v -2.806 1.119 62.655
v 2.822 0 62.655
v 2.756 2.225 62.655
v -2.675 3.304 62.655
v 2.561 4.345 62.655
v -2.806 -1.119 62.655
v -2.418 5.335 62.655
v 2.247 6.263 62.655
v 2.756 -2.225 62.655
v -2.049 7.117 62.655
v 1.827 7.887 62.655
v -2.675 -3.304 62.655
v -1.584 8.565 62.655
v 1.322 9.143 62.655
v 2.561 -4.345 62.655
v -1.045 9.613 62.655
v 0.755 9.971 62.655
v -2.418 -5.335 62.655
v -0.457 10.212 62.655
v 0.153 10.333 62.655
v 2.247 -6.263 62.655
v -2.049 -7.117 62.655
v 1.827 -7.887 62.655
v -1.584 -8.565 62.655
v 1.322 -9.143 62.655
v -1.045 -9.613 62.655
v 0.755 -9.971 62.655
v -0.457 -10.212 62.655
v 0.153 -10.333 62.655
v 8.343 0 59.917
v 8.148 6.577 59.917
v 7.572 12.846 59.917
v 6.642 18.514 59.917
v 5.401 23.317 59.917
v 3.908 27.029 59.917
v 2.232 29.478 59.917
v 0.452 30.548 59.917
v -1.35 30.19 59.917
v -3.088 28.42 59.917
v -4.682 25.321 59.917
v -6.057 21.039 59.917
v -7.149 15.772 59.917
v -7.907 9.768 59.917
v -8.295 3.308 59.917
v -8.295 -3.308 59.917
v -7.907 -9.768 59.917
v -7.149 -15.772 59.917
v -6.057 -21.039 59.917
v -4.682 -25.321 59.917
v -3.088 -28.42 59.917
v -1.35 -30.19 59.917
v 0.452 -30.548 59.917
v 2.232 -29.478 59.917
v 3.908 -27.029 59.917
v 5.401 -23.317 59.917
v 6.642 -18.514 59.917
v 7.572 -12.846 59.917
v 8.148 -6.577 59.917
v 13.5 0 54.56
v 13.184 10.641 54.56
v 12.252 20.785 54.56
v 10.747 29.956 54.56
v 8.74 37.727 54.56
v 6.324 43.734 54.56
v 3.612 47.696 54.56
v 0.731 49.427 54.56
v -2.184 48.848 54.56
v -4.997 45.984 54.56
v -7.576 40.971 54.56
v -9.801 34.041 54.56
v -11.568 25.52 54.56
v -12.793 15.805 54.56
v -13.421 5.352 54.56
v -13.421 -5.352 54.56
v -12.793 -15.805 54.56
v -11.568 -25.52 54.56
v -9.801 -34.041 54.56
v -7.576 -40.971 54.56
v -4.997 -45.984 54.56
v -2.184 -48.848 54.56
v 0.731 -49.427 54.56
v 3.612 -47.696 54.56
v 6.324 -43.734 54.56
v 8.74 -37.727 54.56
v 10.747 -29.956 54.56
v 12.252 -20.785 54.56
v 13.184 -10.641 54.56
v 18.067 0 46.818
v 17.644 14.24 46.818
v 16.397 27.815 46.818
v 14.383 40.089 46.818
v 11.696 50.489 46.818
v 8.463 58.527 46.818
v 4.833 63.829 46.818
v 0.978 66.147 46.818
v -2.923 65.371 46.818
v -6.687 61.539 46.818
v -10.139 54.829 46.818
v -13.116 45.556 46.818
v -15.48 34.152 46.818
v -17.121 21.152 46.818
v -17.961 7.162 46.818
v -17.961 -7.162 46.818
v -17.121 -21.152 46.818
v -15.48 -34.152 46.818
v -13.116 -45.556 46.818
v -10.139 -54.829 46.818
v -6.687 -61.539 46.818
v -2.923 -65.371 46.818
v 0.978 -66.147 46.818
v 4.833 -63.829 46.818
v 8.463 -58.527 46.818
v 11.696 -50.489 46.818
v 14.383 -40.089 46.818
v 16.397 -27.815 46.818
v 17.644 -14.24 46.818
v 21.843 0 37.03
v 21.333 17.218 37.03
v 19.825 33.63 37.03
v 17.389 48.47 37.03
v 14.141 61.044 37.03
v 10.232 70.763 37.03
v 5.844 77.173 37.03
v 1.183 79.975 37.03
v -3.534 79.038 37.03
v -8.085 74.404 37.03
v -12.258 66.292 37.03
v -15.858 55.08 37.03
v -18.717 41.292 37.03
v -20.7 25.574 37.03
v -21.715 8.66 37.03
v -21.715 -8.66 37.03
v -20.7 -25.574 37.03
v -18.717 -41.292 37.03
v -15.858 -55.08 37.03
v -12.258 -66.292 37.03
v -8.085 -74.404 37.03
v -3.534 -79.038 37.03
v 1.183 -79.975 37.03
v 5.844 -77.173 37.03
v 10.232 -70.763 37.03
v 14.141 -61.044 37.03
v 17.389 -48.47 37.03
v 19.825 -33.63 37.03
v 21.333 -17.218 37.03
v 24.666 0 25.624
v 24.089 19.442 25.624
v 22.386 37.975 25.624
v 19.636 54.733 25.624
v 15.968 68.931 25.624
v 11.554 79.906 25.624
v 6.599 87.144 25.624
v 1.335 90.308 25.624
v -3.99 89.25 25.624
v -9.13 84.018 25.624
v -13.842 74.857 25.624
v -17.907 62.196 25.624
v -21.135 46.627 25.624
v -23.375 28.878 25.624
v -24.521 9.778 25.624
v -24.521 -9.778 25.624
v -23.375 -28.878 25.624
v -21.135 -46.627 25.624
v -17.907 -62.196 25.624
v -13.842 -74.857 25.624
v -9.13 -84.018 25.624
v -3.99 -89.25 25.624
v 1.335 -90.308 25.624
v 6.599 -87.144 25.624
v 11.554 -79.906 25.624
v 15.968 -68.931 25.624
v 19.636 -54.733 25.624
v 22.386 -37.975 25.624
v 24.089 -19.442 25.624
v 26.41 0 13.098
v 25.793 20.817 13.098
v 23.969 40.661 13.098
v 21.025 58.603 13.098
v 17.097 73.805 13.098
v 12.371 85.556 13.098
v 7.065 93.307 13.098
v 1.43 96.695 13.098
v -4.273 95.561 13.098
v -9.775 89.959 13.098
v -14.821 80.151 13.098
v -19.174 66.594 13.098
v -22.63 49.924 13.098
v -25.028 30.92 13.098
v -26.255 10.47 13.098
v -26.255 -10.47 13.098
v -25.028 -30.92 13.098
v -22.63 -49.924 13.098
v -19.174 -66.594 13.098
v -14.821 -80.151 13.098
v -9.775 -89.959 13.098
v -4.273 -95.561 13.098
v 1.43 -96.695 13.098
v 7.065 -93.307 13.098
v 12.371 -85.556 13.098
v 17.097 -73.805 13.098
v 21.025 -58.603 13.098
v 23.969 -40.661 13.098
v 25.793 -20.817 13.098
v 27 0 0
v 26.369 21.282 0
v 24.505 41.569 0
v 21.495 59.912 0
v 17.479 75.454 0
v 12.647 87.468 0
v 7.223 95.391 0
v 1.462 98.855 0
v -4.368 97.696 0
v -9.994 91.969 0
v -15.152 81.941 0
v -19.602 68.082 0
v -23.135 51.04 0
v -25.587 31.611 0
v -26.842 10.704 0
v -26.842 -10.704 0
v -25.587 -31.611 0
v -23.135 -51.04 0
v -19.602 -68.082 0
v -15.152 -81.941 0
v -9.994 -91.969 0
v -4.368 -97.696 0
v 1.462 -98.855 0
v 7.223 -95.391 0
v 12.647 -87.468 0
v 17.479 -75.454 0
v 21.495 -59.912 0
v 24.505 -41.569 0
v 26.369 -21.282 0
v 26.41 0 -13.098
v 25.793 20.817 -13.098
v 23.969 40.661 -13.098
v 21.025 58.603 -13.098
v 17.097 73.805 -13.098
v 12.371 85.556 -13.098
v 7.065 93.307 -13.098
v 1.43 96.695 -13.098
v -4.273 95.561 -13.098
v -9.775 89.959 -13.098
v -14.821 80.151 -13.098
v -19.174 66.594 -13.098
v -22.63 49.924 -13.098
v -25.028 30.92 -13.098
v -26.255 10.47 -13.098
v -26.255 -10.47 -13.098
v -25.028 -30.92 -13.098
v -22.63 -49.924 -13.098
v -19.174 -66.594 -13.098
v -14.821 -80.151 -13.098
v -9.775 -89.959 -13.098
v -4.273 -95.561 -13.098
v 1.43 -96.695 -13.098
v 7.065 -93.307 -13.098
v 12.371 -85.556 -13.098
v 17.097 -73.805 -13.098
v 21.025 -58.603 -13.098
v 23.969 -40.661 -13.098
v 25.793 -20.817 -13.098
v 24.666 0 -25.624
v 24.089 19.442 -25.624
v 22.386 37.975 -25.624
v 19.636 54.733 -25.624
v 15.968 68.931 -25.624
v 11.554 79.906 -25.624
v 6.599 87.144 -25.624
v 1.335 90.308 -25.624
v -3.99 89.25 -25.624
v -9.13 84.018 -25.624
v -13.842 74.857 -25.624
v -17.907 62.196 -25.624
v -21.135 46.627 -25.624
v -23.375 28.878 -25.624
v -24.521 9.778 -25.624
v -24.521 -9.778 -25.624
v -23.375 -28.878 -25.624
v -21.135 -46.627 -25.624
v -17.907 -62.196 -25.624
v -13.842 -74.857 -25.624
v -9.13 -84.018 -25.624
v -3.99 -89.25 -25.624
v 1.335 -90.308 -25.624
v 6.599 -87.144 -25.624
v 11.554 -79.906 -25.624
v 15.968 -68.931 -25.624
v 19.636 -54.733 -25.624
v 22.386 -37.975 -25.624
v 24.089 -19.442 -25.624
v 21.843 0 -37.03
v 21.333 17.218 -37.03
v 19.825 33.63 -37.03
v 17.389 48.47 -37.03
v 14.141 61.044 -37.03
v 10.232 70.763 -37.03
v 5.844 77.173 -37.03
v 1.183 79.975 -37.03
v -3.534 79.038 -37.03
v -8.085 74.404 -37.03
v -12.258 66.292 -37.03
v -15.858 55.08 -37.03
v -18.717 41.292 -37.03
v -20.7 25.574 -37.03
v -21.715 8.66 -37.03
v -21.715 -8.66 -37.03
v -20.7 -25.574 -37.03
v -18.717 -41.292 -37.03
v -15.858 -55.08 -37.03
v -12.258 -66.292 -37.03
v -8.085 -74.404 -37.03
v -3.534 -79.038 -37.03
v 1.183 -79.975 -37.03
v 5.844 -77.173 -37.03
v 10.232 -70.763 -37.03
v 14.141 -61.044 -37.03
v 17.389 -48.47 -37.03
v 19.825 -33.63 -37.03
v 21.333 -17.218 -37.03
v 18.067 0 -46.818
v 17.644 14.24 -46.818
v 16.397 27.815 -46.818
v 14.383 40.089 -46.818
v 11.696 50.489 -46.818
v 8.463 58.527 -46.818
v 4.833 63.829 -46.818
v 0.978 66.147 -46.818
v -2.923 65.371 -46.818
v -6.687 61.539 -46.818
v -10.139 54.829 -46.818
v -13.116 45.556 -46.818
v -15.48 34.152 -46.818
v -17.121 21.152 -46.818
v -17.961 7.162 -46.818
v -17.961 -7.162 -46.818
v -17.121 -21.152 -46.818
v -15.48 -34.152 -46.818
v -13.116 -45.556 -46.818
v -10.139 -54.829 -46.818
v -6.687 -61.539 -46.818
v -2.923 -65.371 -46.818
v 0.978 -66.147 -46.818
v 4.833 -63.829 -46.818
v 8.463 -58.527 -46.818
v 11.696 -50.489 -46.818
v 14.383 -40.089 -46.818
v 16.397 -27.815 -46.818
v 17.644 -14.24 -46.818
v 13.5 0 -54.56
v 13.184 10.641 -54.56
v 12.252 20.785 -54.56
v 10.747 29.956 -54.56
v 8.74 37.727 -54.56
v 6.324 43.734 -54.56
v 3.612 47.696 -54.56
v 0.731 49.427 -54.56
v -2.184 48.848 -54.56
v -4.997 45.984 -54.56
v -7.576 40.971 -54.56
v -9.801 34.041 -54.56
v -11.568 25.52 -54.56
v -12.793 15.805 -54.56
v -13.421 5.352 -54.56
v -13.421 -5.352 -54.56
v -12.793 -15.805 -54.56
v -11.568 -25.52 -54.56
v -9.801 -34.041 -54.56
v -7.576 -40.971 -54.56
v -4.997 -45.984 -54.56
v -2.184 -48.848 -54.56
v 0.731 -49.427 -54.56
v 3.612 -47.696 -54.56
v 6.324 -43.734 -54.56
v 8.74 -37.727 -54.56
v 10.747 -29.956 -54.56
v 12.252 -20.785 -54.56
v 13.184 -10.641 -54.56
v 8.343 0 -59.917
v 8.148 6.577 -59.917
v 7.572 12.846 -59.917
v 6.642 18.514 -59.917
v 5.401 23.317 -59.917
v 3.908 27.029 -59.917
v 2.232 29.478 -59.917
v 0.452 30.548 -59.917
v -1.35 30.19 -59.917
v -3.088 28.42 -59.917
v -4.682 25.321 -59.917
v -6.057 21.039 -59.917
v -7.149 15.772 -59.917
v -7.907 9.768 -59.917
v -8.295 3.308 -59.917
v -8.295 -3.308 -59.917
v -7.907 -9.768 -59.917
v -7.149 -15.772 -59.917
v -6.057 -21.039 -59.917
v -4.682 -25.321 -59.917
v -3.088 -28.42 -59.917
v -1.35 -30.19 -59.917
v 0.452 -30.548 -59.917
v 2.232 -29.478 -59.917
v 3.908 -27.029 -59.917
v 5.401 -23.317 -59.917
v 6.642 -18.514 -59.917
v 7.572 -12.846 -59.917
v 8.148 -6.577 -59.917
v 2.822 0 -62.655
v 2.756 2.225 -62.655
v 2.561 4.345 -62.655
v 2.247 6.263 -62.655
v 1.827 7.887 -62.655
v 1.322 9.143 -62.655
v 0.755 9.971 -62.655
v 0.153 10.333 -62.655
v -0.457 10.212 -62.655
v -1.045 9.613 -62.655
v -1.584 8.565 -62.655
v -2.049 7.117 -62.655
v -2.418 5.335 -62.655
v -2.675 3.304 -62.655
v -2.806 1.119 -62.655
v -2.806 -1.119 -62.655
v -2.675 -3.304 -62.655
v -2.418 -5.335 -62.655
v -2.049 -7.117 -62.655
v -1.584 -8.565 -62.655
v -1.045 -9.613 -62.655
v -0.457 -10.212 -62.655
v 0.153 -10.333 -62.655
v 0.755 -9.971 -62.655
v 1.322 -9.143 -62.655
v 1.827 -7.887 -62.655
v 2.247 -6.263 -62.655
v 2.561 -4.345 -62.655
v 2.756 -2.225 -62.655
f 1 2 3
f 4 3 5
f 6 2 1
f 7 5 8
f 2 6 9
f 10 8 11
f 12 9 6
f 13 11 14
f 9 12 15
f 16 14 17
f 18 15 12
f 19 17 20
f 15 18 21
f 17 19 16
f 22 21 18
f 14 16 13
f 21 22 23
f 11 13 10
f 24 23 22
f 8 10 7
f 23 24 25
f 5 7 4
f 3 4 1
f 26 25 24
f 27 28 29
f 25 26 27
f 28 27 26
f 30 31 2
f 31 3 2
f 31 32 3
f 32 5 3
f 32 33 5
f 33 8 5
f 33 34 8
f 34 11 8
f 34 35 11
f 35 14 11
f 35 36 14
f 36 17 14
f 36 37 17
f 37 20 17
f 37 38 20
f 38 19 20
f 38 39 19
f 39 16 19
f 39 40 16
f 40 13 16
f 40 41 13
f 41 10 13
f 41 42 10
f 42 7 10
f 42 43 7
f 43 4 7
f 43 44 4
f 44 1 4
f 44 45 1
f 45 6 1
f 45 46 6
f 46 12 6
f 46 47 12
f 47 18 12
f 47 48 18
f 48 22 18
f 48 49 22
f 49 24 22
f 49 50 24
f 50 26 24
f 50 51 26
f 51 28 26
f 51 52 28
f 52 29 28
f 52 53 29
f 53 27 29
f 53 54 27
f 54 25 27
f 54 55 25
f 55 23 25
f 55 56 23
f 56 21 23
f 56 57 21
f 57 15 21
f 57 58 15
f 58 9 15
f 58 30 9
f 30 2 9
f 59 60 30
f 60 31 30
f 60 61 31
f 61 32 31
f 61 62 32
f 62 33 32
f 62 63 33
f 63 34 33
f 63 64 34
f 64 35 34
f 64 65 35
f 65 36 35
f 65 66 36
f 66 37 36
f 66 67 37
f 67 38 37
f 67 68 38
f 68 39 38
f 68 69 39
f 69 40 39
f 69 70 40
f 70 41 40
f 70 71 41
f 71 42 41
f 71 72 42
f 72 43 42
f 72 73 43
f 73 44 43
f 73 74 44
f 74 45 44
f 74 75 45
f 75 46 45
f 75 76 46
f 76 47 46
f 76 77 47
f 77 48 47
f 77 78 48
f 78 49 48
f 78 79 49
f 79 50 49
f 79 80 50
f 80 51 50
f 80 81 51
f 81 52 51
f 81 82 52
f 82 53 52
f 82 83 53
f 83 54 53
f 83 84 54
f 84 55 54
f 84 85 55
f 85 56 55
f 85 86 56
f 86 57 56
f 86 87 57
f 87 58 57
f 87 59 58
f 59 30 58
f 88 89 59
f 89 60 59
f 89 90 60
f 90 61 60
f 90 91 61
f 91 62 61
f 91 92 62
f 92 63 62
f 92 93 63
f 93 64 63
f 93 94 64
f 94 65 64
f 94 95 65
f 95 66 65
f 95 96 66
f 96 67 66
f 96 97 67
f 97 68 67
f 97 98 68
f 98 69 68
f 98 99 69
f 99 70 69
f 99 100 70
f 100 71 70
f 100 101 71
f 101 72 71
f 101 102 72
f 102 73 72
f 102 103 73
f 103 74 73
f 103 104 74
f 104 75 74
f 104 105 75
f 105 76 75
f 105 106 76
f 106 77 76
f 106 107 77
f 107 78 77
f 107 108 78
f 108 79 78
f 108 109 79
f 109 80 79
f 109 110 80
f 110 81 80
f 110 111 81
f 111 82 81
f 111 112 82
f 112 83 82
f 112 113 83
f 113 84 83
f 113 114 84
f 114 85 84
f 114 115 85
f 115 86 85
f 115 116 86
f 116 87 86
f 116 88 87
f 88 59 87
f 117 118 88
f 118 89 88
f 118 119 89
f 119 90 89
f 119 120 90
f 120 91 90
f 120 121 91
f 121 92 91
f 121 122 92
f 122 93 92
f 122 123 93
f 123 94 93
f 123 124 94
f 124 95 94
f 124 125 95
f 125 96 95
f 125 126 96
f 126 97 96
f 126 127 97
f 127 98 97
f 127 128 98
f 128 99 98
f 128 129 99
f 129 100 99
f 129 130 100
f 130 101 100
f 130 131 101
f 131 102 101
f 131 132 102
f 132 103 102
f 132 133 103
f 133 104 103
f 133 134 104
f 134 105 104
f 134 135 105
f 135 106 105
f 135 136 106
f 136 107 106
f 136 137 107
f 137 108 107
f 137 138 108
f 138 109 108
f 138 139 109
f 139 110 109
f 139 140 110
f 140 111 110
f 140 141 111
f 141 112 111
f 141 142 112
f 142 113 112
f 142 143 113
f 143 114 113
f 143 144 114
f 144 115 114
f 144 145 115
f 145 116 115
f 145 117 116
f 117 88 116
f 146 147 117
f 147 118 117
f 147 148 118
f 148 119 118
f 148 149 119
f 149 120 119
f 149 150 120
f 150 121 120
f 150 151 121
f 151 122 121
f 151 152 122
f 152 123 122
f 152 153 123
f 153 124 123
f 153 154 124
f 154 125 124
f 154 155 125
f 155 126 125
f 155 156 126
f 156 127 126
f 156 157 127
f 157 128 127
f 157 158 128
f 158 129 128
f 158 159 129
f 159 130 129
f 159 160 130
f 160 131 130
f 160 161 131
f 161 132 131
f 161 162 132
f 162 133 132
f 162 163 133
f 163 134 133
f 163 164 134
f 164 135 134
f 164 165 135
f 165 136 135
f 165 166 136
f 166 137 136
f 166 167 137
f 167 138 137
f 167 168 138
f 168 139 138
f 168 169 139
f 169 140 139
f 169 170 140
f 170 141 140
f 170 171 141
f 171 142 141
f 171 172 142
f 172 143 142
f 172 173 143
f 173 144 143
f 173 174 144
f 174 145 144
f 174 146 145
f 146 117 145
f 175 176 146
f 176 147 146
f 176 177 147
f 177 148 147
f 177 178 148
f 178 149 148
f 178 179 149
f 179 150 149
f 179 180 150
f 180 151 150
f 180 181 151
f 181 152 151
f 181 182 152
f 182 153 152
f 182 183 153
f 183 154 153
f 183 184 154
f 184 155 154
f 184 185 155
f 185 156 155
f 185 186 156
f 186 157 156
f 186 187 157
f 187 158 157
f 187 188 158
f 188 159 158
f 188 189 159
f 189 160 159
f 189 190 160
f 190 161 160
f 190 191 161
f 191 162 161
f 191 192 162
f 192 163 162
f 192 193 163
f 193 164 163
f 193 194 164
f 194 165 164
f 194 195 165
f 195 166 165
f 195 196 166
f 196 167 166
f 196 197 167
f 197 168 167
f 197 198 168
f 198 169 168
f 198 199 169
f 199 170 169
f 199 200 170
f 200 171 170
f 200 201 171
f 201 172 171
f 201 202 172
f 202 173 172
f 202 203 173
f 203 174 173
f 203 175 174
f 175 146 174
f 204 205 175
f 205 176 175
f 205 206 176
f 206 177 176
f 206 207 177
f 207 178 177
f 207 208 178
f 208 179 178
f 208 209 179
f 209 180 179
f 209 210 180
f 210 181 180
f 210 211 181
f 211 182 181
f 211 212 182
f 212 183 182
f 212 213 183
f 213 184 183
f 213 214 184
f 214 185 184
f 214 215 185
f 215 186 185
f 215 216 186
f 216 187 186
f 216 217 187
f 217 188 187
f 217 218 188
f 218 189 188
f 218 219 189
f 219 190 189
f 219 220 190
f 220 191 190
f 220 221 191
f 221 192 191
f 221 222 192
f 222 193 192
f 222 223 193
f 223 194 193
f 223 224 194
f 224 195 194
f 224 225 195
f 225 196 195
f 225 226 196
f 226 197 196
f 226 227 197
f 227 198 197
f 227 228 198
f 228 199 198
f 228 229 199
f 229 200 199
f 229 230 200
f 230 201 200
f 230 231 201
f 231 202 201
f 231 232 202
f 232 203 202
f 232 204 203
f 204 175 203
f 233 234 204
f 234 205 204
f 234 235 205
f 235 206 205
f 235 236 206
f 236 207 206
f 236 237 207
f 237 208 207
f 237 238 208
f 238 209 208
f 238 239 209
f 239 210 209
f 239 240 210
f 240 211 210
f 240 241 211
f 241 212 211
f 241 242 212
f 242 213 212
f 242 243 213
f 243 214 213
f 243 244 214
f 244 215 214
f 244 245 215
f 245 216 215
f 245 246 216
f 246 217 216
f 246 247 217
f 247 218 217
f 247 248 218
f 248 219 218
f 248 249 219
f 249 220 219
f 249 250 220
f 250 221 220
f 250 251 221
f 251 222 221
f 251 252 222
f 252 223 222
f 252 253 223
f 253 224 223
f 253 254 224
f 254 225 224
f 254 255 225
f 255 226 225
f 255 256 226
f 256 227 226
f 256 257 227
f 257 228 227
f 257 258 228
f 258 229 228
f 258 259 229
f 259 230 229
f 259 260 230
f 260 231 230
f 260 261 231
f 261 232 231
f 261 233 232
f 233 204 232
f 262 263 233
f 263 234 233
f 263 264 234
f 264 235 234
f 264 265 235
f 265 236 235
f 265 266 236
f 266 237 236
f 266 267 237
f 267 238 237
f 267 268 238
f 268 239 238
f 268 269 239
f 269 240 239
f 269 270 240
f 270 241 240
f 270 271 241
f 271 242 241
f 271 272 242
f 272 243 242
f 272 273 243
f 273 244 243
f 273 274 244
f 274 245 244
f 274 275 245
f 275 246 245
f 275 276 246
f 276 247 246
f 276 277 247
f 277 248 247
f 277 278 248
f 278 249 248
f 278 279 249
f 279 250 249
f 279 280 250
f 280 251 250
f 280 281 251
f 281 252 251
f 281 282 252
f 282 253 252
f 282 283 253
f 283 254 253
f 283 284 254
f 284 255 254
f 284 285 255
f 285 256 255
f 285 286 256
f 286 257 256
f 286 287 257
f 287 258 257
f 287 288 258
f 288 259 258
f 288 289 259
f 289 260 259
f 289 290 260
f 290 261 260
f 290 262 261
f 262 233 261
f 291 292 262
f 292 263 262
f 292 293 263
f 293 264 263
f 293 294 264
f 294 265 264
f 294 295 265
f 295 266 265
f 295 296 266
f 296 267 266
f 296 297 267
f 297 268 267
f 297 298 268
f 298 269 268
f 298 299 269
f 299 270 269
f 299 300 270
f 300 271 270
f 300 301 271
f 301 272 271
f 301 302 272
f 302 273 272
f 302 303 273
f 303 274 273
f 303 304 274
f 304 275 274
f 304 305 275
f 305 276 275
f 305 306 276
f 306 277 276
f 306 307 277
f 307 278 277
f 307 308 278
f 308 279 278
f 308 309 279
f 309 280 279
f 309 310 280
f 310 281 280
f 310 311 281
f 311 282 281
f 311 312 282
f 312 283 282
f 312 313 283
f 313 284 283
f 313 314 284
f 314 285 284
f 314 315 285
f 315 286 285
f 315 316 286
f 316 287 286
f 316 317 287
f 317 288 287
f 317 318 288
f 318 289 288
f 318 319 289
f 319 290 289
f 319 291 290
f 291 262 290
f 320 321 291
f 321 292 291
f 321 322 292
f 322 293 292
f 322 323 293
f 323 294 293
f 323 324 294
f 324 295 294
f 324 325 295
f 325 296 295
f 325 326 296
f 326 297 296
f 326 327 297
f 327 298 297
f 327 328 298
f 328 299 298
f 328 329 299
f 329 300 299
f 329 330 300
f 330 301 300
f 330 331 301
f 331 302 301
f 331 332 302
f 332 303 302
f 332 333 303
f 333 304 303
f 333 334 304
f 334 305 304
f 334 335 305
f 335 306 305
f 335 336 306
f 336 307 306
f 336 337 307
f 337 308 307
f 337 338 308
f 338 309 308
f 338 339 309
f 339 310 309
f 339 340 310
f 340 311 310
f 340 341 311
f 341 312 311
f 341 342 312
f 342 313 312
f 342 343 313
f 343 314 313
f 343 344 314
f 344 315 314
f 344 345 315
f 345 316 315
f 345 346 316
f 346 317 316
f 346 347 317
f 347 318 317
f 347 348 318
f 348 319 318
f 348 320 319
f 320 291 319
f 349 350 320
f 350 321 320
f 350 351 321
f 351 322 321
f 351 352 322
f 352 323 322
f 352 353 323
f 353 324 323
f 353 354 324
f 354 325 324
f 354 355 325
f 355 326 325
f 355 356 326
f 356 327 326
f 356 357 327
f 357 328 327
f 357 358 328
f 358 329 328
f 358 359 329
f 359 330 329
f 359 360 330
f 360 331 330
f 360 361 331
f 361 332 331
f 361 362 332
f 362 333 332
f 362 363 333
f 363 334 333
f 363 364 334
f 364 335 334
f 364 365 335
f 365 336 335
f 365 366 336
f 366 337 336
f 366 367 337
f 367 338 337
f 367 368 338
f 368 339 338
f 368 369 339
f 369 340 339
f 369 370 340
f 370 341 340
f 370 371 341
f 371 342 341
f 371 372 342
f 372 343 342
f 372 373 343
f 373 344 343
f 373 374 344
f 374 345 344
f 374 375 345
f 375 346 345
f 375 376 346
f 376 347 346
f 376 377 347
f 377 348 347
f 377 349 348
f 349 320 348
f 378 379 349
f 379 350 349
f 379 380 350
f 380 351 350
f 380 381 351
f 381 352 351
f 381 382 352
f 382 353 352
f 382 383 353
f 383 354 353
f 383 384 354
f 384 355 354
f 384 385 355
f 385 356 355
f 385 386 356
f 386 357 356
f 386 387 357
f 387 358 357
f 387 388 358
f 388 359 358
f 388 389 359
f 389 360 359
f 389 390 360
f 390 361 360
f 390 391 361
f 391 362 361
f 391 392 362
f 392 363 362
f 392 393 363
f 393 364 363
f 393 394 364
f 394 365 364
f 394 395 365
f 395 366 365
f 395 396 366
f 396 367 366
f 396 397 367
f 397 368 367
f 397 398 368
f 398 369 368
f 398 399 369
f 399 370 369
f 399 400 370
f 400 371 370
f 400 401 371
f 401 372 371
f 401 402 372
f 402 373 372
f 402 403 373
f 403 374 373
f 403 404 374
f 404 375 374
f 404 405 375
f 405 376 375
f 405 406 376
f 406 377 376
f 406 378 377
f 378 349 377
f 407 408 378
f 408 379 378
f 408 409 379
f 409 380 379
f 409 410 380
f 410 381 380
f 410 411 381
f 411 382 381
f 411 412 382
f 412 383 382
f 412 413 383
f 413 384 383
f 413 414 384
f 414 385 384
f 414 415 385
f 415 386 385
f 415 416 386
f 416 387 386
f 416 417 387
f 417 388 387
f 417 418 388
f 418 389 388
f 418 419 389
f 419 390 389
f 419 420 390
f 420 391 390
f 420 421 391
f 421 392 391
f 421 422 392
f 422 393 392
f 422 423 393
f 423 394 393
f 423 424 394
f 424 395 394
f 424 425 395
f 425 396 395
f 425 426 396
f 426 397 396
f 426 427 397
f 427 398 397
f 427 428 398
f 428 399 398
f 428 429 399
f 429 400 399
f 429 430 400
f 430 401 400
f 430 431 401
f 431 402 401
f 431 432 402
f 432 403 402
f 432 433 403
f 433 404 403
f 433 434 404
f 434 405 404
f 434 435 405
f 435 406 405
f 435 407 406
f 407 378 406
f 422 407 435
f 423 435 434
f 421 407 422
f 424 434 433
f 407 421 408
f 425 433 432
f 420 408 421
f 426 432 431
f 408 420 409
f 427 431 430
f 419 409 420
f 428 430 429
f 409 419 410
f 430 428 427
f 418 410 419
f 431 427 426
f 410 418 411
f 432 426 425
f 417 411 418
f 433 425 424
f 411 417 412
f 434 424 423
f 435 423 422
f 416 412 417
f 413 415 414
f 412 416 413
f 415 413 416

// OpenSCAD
// Generated by SolidPython 1.0.1 on 2020-07-29 00:46:45


scale(v = [3, 11, 7]) {
	sphere(r = 9);
}
/***********************************************
*********      SolidPython code:      **********
************************************************
 
# import packages: SolidPython
from solid import *
from solid.utils import *
from itertools import chain, combinations, permutations


class Resize:

    def __init__(self, scad_file):
        self.scad_file = scad_file
        #self.scad_file = import_scad(scad_file)
        # cone/cylinder param:
        self.r1 = 0
        self.r2 = 0
        self.h = 0
        # rectangular prism param:
        self.w = 0
        self.l = 0
        # ellipse param:
        self.r = 0

    # import OpenScad code (file name corresponds to shape)


    # classify shape + parameters
    def assign(self, param1, param2, param3):
        if self.scad_file == 'cone.scad':
            self.r1 = param1
            self.r2 = param2
            self.h = param3
        elif self.scad_file == 'cylinder.scad':
            self.r1 = param1
            self.r2 = param2
            self.h = param3
        elif self.scad_file == 'rectangularPrism.scad':
            self.h = param1
            self.l = param2
            self.w = param3
        else:
            self.r = param1
            self.h = param2

    # resize parameters
    def iterate(self):
        x = range(3, 20, 2)
        i = 1
        if self.scad_file == 'cone.scad':
            tempList = list(permutations(x, 2))
            for temp in tempList:
                param1 = temp[0]
                param2 = temp[1]
                filepath = 'produced_scad_files/' + 'cone' + str(param1) + '_' + str(param2) + '_' + '.scad'
                scad_render_to_file(cylinder(h=param1, r1=param2, r2=0), filepath)

        elif self.scad_file == 'cylinder.scad':
            tempList = list(permutations(x, 3))
            for temp in tempList:
                param1 = temp[0]
                param2 = temp[1]
                filepath = 'produced_scad_files/' + 'cylinder' + str(param1) + '_' + str(param2) + '_' + '.scad'
                scad_render_to_file(cylinder(h=param1, r1=param2, r2=param2), filepath)

        elif self.scad_file == 'rectangularPrism.scad':
            tempList = list(permutations(x, 3))
            for temp in tempList:
                param1 = temp[0]
                param2 = temp[1]
                param3 = temp[2]
                filepath = 'produced_scad_files/' + 'rectangularPrism' + str(param1) + '_' + str(param2) + '_' + str(
                    param3) + '.scad'
                scad_render_to_file(cube(size=(param1, param2, param3)), filepath)

        elif self.scad_file == 'ellipse.scad':
            tempList = list(permutations(x, 4))
            for temp in tempList:
                param1 = temp[0]
                param2 = temp[1]
                param3 = temp[2]
                param4 = temp[3]
                filepath = 'produced_scad_files/' + 'ellipse' + str(param1) + '_' + str(param2) + '_' + str(param3) + '_' + str(param4) + '.scad'
                scad_render_to_file(scale([param1, param2, param3])(sphere(r=param4)), filepath)

    def render_to_scadfile(self):
        scad_render_to_file(scad, 'example.scad') 
 
************************************************/
